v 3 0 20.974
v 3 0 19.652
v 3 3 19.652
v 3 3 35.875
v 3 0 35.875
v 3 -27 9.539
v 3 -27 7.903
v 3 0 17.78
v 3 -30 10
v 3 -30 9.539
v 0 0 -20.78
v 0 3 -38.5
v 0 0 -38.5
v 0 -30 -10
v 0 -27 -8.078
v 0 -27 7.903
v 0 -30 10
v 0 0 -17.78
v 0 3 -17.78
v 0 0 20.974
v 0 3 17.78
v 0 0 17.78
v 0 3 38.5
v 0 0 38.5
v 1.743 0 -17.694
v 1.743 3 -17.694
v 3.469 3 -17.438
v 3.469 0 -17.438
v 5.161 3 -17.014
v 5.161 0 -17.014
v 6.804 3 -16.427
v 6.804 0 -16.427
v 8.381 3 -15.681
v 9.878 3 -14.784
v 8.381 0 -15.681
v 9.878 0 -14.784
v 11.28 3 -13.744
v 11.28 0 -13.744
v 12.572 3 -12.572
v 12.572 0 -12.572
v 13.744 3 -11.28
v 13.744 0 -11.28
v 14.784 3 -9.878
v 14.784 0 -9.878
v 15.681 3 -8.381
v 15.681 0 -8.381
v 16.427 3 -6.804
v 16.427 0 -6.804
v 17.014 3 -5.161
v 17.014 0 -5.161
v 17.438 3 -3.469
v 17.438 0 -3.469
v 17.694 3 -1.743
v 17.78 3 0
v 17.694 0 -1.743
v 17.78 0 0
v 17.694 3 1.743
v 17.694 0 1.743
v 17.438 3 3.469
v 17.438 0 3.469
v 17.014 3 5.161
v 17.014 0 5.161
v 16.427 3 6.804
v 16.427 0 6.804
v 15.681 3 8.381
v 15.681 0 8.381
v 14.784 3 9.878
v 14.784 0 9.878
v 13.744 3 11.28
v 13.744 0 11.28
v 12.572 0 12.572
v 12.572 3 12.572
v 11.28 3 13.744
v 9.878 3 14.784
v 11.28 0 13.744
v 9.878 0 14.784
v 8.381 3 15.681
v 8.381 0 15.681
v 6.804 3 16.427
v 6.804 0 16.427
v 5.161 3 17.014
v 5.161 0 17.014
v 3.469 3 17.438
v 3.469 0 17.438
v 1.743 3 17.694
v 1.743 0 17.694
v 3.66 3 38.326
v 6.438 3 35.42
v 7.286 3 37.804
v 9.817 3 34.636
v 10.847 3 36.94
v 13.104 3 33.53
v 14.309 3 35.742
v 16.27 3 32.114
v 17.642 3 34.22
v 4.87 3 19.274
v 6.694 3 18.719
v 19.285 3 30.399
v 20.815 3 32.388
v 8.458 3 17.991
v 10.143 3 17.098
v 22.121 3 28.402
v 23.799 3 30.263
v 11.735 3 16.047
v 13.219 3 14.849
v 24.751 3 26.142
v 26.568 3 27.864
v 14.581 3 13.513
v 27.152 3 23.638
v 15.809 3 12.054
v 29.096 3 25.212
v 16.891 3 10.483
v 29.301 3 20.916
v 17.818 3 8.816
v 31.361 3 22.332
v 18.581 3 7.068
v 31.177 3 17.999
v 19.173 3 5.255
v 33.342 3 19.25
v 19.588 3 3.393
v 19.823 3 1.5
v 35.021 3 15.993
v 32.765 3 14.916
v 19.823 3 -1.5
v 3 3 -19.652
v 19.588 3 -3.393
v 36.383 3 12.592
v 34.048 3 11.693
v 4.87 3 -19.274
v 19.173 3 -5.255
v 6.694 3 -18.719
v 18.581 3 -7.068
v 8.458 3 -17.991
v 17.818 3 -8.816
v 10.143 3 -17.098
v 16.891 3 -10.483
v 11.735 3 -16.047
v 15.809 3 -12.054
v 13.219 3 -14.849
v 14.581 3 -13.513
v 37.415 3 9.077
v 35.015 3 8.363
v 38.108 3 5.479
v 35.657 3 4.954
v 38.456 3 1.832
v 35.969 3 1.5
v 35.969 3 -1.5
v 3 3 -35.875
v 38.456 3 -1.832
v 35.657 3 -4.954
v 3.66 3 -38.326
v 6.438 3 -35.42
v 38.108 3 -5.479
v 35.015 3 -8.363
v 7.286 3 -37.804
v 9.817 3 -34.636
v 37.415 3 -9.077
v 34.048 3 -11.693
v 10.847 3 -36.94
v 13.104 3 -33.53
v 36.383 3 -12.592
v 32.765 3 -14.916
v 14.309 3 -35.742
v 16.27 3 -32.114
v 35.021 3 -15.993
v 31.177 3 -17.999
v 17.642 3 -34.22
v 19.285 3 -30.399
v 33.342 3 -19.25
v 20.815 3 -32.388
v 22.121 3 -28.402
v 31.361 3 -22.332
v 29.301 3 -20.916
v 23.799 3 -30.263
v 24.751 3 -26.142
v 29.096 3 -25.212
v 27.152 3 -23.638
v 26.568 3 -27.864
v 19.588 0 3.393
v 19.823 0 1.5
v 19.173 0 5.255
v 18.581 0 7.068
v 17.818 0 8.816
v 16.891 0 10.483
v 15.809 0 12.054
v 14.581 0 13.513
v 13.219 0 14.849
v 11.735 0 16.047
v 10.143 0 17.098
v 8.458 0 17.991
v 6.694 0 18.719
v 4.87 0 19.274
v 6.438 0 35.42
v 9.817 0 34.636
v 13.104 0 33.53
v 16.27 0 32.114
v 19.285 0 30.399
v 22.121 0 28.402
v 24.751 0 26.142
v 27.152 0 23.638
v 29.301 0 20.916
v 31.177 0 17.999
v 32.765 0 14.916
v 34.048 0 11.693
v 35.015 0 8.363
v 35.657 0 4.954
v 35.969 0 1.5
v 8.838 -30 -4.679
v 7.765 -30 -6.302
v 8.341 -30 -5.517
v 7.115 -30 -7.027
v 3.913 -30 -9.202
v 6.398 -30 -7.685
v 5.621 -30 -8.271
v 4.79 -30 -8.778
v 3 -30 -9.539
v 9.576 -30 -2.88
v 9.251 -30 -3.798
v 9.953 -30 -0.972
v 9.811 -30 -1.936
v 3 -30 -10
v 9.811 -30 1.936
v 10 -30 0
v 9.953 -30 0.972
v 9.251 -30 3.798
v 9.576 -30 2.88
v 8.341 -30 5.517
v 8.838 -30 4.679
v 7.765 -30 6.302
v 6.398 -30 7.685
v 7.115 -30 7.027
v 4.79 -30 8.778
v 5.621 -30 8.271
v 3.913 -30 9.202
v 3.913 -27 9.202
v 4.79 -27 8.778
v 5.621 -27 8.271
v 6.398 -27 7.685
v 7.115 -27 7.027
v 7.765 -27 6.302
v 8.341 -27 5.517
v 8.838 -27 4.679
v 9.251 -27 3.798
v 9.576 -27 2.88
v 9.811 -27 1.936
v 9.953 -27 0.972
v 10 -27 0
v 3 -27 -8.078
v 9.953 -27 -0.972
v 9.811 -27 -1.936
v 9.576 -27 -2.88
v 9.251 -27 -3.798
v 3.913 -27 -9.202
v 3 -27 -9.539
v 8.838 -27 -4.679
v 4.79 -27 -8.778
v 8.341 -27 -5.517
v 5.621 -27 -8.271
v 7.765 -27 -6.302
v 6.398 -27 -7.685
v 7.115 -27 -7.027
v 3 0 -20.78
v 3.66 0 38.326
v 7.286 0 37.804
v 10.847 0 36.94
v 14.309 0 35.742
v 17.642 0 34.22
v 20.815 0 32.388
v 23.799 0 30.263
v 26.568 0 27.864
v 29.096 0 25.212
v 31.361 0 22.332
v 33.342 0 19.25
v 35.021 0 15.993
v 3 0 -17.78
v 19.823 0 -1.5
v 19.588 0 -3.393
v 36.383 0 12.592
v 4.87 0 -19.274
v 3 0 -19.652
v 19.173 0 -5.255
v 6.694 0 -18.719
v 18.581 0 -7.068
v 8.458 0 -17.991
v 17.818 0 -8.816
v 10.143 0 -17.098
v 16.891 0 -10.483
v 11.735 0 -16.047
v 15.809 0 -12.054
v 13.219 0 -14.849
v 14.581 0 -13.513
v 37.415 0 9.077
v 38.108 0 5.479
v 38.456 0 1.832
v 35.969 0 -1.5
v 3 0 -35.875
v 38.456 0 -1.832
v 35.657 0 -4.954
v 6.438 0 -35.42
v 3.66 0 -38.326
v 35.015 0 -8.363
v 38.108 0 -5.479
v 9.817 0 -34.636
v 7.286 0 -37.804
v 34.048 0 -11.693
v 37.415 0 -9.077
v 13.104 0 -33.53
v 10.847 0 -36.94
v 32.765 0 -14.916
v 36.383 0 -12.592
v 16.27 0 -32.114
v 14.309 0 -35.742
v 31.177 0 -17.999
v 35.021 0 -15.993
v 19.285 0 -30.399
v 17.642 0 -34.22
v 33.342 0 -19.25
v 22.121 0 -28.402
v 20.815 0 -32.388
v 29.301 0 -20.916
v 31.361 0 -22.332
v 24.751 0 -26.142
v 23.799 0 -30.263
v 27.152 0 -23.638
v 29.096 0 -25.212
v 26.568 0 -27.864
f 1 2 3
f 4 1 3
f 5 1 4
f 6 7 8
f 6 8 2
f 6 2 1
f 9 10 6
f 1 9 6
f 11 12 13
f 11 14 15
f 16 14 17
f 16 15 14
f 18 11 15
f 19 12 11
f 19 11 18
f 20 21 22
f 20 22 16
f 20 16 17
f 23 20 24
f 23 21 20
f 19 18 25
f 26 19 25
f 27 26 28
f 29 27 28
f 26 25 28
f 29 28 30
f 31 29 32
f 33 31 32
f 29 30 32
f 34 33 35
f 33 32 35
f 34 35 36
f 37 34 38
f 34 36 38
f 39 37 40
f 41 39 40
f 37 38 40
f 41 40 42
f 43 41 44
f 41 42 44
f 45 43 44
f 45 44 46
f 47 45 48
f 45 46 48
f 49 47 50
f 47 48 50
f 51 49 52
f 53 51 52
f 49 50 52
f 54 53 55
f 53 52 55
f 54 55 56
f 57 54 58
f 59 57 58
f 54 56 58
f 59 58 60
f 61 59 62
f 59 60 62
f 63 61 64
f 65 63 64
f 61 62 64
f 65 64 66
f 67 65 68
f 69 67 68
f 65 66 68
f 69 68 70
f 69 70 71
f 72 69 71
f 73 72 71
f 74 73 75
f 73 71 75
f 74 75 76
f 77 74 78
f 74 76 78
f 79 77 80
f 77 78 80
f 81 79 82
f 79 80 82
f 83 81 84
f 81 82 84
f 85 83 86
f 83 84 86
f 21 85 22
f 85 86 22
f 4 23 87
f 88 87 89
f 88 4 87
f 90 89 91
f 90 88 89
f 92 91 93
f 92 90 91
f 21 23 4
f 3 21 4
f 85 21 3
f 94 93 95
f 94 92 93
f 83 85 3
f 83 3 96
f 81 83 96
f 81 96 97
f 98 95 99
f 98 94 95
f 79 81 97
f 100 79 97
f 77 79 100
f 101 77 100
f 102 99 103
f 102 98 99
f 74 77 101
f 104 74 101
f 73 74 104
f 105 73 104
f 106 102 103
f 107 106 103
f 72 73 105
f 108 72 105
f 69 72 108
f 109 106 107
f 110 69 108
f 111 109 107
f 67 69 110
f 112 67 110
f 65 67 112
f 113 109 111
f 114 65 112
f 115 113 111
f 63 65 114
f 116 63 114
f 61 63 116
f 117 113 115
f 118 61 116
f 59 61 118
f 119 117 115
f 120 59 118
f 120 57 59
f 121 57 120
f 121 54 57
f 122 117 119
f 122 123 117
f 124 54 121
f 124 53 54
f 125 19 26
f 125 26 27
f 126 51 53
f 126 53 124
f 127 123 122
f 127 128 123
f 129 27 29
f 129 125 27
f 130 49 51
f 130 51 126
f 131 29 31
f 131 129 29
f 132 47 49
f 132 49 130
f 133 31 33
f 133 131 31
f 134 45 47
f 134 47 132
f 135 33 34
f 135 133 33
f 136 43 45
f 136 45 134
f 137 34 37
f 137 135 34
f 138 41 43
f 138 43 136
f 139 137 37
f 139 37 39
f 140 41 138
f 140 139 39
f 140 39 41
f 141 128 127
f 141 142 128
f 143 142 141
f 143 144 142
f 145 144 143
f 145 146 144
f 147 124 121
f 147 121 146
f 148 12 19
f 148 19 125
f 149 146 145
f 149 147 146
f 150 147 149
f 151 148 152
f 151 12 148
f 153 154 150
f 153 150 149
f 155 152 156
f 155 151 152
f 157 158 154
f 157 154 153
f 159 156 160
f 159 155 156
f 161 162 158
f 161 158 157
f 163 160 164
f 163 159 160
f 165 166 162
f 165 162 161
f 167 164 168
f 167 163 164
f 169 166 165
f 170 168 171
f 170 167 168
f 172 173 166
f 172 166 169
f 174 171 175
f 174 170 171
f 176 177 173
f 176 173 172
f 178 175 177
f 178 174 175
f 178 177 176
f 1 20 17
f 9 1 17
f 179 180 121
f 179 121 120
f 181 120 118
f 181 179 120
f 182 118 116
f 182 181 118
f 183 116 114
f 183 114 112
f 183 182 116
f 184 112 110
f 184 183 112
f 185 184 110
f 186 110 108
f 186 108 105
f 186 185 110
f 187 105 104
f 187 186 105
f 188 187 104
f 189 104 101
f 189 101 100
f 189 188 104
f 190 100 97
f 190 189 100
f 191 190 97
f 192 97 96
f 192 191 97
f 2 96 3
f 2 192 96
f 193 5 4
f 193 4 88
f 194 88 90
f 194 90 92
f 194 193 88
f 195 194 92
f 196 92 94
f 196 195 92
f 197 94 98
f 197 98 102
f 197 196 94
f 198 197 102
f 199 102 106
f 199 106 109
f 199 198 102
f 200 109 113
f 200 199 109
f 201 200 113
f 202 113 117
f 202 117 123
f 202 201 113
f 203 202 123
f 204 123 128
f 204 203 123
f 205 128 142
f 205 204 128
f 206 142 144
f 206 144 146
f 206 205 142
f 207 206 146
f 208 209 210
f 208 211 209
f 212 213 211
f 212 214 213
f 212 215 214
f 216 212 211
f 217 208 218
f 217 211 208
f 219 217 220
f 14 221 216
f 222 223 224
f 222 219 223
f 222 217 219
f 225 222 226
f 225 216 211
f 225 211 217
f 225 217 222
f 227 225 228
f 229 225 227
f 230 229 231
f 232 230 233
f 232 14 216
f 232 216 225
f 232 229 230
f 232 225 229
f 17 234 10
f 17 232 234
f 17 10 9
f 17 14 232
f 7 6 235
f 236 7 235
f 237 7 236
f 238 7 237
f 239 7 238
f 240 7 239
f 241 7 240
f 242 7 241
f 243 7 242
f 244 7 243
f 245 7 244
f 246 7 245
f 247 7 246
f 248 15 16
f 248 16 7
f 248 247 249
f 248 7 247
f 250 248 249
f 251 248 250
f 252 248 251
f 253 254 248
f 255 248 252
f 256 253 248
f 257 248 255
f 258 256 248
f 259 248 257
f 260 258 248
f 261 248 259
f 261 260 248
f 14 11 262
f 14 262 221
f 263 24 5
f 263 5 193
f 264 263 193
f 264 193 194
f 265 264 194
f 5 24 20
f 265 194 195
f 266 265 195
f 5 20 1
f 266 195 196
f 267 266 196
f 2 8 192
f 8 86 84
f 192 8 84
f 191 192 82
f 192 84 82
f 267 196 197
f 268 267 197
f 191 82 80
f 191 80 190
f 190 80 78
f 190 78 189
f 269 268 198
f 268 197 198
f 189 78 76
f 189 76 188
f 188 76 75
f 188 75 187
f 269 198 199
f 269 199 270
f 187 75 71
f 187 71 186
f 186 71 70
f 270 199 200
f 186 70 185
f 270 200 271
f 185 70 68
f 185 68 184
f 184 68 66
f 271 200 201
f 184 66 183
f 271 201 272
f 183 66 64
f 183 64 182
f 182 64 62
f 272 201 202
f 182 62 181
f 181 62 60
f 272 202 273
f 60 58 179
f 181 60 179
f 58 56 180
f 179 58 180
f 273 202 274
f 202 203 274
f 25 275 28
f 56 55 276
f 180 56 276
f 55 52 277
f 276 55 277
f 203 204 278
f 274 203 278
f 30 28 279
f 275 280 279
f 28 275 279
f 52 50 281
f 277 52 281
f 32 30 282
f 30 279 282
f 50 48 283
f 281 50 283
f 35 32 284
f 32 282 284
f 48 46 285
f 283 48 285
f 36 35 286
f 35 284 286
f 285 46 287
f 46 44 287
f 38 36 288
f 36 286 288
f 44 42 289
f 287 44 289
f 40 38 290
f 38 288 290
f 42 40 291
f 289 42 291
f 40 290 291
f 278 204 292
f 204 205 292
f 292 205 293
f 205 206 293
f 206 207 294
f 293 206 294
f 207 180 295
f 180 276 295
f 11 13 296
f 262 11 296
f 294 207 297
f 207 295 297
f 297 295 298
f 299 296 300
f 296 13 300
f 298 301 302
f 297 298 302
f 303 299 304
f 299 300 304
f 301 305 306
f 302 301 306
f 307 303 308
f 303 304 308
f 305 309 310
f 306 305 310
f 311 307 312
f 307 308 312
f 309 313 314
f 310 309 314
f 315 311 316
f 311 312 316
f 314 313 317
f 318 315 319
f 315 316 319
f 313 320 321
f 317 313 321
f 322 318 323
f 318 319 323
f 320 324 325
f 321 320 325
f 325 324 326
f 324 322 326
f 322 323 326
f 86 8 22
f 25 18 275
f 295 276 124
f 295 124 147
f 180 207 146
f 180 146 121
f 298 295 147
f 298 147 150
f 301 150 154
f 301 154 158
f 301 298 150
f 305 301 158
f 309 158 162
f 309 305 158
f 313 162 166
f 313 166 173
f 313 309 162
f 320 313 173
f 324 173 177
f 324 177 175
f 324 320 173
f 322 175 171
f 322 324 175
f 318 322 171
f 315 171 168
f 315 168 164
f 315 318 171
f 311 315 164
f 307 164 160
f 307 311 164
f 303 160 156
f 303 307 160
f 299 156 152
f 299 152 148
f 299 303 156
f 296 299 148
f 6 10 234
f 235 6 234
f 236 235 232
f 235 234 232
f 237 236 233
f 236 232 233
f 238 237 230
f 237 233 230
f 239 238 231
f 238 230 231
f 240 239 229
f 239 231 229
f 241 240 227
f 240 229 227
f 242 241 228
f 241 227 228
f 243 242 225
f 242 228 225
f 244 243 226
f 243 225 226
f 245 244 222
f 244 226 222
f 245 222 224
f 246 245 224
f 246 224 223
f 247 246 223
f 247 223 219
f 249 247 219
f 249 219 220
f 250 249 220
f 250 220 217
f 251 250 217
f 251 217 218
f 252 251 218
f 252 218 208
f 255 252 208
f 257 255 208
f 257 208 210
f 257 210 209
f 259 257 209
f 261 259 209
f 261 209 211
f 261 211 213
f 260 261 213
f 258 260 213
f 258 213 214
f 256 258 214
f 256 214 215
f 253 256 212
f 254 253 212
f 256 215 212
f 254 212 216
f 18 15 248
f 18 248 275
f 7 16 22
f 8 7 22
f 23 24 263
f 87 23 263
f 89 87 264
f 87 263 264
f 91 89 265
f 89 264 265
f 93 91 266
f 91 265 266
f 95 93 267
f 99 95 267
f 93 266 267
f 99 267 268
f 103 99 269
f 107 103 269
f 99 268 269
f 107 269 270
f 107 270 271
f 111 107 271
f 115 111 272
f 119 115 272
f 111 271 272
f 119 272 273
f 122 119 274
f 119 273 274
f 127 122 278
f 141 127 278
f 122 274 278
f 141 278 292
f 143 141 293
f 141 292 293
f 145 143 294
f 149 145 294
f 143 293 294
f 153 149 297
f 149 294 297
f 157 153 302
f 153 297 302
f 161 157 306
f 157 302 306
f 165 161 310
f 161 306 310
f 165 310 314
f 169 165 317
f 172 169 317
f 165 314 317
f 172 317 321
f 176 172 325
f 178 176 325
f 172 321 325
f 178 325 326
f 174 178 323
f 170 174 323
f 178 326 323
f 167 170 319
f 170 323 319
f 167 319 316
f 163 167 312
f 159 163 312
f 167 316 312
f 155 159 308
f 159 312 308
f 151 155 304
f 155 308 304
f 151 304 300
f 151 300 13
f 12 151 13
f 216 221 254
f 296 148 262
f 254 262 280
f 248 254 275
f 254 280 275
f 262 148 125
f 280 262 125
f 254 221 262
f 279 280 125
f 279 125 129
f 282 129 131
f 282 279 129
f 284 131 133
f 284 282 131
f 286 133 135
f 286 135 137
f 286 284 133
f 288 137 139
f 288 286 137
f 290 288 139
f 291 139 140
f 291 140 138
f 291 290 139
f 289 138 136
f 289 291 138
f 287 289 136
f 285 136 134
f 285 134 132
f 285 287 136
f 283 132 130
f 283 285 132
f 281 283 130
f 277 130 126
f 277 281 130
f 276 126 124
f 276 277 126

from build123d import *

# Parameters (mm, degrees)
BOSS_EXTRUDE2_DEPTH = 3
BOSS_EXTRUDE3_DEPTH = 3
BOSS_EXTRUDE4_DEPTH = 3


with BuildPart() as part:
    # Sketch1 → Boss-Extrude2 (new body)
    with BuildSketch(Plane(origin=(0, 0, 0), x_dir=(1, 0, 0), z_dir=(0, 1, 0))):
        with BuildLine():
            Line((0, -17.78), (0, -38.5))
            ThreePointArc((0, -38.5), (38.5, 0), (0, 38.5))
            Line((0, 38.5), (0, 17.78))
            ThreePointArc((0, 17.78), (17.78, 0), (0, -17.78))
        make_face()
        with BuildLine():
            Line((3, 35.874782229), (3, 19.652338283))
            ThreePointArc((3, 19.652338283), (14.580910151, 13.513380746), (19.82332969, 1.5))
            Line((19.82332969, 1.5), (35.968736425, 1.5))
            ThreePointArc((35.968736425, 1.5), (25.981666959, 24.918928188), (3, 35.874782229))
        make_face(mode=Mode.SUBTRACT)
        with BuildLine():
            Line((3, -19.652338283), (3, -35.874782229))
            ThreePointArc((3, -35.874782229), (25.981666959, -24.918928188), (35.968736425, -1.5))
            Line((35.968736425, -1.5), (19.82332969, -1.5))
            ThreePointArc((19.82332969, -1.5), (14.580910151, -13.513380746), (3, -19.652338283))
        make_face(mode=Mode.SUBTRACT)
    extrude(amount=BOSS_EXTRUDE2_DEPTH)



with BuildPart() as body_2:
    # Sketch4 → Boss-Extrude3 (new body)
    with BuildSketch(Plane(origin=(0, -30, 0), x_dir=(-1, 0, 0), z_dir=(0, -1, 0))):
        with BuildLine():
            Line((0, 10), (0, -10))
            ThreePointArc((0, -10), (-10, 0), (0, 10))
        make_face()
    extrude(amount=-BOSS_EXTRUDE3_DEPTH)


with BuildPart() as part_1:
    add(part.part)

    add(body_2.part)  # Boss-Extrude4 merges body 2
    # Sketch6 → Boss-Extrude4 (add)
    with BuildSketch(Plane(origin=(0, 0, 0), x_dir=(0, 0, -1), z_dir=(1, 0, 0))):
        Polygon((20.78, 0), (10, -30), (8.078, -30), (8.078, -27), (17.78, 0), align=None)
        Polygon((-20.974429694, 0), (-10, -30), (-7.903013275, -30), (-7.903013275, -27), (-17.78, 0), align=None)
    extrude(amount=BOSS_EXTRUDE4_DEPTH)


solid = part_1.part
